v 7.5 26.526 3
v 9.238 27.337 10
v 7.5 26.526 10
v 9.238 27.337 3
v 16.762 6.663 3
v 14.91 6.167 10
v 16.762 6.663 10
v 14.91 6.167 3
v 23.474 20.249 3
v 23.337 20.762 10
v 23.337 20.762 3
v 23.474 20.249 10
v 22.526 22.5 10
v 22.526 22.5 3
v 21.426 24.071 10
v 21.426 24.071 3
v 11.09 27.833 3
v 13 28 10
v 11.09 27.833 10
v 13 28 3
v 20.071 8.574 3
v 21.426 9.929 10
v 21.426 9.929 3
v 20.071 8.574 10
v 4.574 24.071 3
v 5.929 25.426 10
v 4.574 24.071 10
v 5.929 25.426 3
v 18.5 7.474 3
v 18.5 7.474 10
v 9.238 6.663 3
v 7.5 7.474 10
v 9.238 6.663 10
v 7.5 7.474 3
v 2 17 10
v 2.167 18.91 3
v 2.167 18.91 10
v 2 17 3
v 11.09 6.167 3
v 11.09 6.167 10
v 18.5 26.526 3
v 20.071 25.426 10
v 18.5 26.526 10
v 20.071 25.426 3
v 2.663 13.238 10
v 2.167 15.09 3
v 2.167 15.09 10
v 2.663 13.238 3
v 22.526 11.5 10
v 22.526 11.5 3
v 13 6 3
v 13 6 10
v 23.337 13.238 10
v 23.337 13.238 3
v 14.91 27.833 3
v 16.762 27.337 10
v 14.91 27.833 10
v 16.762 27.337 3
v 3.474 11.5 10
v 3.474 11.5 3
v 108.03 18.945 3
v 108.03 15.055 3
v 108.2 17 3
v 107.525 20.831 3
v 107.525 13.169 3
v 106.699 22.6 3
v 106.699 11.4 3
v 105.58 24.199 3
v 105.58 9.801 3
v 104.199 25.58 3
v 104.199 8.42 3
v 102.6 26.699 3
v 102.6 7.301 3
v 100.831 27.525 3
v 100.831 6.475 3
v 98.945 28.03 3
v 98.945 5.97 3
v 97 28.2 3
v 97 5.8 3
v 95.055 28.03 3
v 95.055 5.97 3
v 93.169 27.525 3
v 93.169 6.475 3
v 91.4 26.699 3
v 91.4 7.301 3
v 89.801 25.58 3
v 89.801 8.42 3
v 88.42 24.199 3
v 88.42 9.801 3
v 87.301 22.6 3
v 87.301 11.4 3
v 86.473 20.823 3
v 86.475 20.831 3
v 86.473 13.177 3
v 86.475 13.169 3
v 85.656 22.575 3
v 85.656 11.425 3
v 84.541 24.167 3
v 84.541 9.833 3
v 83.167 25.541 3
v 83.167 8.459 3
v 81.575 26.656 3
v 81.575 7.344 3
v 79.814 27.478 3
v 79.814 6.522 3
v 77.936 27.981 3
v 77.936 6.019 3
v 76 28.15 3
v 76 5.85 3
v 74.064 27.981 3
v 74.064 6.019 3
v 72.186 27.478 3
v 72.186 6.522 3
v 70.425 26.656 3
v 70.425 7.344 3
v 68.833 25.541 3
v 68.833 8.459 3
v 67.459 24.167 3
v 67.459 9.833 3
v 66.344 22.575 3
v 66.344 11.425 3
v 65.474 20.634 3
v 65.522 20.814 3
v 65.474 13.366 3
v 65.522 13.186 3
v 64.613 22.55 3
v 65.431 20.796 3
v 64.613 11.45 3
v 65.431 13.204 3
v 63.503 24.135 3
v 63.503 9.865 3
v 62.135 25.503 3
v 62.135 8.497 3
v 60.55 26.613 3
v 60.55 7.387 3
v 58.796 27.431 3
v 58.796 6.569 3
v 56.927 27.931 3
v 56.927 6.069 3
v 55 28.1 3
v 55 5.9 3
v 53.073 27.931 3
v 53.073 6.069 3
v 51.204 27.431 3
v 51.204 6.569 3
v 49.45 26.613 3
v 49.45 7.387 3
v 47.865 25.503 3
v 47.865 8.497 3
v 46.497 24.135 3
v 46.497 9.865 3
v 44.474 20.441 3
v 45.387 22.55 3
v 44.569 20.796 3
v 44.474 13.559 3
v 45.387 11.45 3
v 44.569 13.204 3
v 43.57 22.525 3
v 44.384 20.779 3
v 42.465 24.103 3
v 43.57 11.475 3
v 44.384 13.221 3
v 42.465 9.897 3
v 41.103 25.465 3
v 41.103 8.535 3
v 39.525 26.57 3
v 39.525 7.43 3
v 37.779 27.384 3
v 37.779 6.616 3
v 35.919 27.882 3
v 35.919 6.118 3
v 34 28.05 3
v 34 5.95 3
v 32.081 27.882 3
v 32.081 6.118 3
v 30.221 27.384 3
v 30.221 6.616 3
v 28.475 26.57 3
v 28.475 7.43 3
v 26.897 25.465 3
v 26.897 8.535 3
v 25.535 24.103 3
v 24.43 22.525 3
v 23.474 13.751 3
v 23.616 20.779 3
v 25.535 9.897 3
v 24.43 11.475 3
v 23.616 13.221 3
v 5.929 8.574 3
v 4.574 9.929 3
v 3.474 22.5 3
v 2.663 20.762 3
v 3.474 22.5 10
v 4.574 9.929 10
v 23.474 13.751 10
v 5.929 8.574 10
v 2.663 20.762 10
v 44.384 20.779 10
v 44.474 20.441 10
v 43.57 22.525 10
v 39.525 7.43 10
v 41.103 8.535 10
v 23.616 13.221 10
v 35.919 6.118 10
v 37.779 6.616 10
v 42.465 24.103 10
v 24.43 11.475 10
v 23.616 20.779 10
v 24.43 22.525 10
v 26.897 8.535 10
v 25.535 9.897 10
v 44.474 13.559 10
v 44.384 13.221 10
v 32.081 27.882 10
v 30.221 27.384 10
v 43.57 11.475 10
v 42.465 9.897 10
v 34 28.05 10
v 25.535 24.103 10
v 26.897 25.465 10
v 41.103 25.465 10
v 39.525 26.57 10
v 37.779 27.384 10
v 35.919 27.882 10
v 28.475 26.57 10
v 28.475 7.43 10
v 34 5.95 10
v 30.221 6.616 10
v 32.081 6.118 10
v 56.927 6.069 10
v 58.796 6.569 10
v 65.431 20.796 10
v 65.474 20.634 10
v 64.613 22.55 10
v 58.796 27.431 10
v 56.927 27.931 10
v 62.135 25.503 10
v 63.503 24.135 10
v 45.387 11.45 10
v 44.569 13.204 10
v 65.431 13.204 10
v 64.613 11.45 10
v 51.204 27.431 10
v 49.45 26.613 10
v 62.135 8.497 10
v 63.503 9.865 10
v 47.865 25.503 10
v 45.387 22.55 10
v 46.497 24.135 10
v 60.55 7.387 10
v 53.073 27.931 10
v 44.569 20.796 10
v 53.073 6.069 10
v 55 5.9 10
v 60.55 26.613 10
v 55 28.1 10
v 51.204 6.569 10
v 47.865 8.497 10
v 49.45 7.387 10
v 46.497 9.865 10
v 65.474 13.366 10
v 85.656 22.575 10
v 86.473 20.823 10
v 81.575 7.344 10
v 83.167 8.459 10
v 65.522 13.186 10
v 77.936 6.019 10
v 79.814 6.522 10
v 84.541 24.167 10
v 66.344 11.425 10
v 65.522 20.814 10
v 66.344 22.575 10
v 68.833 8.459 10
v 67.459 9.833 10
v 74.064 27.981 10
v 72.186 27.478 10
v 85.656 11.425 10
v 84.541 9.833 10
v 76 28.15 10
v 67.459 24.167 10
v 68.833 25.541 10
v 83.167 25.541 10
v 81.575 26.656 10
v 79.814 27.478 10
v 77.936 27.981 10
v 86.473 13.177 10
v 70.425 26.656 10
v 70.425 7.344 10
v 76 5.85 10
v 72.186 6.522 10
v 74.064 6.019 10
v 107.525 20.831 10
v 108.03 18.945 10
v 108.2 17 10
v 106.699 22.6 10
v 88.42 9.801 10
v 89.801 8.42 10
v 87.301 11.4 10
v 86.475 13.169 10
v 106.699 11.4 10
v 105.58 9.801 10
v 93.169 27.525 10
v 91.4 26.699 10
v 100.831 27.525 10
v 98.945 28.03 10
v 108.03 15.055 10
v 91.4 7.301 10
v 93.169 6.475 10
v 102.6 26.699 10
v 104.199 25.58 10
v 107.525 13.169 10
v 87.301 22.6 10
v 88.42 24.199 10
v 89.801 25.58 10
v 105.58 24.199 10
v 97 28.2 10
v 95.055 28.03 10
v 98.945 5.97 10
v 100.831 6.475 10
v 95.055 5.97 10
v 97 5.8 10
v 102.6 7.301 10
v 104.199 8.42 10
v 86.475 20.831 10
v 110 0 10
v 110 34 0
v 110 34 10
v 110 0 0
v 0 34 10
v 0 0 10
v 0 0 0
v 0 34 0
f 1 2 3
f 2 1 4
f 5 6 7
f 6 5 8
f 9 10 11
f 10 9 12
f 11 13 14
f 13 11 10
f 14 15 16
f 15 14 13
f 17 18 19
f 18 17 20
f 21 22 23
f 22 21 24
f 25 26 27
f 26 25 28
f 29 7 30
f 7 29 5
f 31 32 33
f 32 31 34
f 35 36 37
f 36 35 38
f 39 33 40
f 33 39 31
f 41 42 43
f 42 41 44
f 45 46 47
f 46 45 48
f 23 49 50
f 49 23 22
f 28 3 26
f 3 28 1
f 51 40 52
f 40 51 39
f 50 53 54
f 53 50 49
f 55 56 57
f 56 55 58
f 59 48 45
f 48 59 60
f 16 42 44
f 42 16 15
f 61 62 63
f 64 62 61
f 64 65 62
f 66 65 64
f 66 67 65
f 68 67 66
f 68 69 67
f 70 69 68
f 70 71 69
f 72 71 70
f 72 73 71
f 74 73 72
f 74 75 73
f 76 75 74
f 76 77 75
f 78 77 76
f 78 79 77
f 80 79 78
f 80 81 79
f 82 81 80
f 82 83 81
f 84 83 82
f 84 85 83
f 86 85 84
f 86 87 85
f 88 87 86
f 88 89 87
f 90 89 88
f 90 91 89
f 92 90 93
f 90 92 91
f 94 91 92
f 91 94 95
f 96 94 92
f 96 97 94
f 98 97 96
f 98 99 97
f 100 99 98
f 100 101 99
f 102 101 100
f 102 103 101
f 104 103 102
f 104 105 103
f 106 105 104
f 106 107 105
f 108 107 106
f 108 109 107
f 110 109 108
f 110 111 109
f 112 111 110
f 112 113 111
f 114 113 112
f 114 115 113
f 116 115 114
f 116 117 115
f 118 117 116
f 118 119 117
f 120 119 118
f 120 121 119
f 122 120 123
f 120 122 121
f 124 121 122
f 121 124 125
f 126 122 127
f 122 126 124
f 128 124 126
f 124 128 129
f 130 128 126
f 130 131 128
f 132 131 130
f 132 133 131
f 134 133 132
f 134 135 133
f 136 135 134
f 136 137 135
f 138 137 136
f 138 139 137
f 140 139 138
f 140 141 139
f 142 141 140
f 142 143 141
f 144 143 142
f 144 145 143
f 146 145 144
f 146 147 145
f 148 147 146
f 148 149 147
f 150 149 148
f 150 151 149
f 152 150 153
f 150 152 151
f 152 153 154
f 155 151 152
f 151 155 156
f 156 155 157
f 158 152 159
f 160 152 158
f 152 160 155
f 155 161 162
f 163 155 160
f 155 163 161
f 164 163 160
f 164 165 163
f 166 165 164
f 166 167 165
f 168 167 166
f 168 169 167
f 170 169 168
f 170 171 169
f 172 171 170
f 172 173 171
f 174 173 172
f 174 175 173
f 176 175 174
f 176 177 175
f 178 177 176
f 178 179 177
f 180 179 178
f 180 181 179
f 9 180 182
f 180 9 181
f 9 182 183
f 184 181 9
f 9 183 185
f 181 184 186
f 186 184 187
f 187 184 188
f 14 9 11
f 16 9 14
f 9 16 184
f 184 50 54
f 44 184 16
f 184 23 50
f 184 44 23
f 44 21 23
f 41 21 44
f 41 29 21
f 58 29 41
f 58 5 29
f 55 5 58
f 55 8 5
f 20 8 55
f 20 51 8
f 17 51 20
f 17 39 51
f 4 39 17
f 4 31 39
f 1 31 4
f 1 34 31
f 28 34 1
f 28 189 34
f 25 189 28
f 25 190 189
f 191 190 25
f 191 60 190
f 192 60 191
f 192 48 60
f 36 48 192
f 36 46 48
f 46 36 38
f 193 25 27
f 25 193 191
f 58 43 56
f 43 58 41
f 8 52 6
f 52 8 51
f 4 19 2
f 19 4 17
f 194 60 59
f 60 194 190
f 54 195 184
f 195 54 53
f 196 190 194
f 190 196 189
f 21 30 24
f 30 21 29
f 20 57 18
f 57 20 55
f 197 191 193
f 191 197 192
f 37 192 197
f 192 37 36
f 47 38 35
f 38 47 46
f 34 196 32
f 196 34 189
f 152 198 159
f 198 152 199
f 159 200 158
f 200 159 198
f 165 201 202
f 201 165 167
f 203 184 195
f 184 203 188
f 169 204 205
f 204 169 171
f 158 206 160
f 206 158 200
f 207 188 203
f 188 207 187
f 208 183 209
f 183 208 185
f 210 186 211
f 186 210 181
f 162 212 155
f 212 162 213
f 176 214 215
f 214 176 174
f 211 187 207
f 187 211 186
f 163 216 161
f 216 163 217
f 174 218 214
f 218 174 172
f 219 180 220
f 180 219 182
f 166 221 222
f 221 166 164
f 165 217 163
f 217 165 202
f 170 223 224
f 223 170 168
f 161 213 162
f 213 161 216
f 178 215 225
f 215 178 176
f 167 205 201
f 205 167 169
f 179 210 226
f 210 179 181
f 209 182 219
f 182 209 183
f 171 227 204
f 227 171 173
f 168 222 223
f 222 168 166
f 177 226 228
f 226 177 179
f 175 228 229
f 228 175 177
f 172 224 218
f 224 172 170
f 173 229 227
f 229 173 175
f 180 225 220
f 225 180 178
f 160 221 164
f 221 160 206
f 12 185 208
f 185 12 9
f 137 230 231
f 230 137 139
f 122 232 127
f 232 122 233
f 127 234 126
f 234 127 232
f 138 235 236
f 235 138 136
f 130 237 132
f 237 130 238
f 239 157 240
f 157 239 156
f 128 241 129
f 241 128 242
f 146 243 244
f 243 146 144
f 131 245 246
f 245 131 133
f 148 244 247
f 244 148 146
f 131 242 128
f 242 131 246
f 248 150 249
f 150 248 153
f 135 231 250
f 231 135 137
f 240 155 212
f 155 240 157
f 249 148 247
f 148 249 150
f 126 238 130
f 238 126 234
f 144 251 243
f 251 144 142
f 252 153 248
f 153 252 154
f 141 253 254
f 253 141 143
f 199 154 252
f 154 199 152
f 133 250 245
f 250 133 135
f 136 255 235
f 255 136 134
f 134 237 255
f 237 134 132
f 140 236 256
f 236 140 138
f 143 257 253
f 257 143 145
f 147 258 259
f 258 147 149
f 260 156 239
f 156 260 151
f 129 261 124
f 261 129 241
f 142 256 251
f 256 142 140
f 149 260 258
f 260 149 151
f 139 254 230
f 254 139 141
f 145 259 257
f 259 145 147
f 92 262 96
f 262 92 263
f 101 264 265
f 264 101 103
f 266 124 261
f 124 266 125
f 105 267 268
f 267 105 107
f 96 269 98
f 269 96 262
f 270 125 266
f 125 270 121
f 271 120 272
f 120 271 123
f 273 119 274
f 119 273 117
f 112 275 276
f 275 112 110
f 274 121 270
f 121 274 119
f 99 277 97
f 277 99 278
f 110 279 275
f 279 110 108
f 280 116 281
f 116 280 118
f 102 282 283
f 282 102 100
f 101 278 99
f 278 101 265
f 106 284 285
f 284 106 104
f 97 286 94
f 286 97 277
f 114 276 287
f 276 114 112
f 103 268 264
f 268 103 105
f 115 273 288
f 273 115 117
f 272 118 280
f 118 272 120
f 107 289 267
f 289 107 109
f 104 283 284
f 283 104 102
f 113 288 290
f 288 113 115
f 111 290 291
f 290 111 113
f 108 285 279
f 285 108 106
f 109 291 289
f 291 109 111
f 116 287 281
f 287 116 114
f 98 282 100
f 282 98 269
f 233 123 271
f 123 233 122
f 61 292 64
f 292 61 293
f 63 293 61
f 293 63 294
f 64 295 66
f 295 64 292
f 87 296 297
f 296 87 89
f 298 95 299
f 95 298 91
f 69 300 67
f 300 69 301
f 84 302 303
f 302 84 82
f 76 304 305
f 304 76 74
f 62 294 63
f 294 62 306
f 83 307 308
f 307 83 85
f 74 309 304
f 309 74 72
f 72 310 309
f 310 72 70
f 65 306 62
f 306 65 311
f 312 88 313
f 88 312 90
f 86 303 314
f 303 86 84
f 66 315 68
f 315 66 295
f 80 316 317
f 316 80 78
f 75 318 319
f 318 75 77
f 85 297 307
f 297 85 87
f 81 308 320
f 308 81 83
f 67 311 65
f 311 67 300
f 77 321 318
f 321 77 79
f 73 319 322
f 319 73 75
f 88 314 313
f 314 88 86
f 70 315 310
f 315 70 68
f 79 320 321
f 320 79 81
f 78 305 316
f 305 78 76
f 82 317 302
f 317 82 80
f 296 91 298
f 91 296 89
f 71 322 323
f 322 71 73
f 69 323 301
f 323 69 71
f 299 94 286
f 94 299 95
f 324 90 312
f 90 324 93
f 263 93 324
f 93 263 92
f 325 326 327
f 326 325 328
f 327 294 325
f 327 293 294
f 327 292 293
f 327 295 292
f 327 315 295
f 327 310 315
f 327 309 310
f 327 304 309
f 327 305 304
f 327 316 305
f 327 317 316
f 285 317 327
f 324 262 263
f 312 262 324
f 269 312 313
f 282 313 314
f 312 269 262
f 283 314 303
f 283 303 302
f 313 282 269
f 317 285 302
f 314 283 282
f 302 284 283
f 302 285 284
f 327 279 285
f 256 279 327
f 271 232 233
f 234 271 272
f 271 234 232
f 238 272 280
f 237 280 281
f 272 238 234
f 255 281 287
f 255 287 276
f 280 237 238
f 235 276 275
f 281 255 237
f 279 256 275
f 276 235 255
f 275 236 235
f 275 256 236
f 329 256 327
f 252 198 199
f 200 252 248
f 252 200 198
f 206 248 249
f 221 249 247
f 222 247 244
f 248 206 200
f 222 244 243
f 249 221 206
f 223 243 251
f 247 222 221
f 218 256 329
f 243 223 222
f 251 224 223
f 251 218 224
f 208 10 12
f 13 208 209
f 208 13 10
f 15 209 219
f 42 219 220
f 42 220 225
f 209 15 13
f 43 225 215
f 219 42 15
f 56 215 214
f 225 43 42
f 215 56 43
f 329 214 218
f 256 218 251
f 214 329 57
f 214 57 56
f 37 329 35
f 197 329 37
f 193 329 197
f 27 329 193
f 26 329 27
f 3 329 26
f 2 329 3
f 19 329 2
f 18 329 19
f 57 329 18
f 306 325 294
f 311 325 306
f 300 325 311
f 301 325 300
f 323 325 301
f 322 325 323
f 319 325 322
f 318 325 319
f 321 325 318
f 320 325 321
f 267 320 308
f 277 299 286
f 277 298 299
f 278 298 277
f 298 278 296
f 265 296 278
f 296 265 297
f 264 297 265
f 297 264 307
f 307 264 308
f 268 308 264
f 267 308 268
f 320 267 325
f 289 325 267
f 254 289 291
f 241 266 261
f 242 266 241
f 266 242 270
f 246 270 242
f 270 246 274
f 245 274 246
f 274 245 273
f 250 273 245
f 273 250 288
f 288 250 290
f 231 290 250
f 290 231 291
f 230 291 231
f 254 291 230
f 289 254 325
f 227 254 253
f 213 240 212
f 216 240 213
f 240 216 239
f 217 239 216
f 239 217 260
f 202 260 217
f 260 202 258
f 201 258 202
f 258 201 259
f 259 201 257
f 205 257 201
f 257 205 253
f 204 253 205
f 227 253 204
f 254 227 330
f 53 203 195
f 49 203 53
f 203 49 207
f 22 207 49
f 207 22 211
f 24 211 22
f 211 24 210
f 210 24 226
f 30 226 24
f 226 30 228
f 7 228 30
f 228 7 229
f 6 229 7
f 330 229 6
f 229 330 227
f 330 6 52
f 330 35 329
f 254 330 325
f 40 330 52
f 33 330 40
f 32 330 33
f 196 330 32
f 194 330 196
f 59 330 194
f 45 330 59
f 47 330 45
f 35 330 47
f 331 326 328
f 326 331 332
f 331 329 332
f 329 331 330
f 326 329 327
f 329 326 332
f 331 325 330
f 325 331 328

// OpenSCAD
$fn=36;
module bearing_coupon(){ds=[22.0,22.1,22.2,22.3,22.4];difference(){cube([110,34,10]);for(i=[0:4])translate([13+i*21,17,3])cylinder(h=8,d=ds[i]);}}
module shaft_coupon(){d8=[8.0,8.1,8.2,8.3,8.4];d10=[10.0,10.1,10.2,10.3,10.4];difference(){cube([110,50,8]);for(i=[0:4])translate([13+i*21,14,-1])cylinder(h=10,d=d8[i]);for(i=[0:4])translate([13+i*21,36,-1])cylinder(h=10,d=d10[i]);}}
module magnet_coupon(){ds=[6.0,6.1,6.2,6.3,6.4];difference(){cube([110,32,6]);for(i=[0:4])translate([13+i*21,16,3])cylinder(h=4,d=ds[i]);}}
module tube_coupon(){ds=[22.0,22.2,22.4,22.6,22.8];difference(){cube([130,38,8]);for(i=[0:4])translate([15+i*25,19,-1])cylinder(h=10,d=ds[i]);}}
module fastener_coupon(){d3=[3.2,3.4,3.6];d4=[4.2,4.4,4.6];d5=[5.2,5.4,5.6];difference(){cube([105,42,7]);for(i=[0:2])translate([15+i*15,12,-1])cylinder(h=9,d=d3[i]);for(i=[0:2])translate([15+i*15,30,-1])cylinder(h=9,d=d4[i]);for(i=[0:2])translate([65+i*15,21,-1])cylinder(h=9,d=d5[i]);}}
part=is_undef(part)?"bearing":part;
if(part=="bearing")bearing_coupon();if(part=="shaft")shaft_coupon();if(part=="magnet")magnet_coupon();if(part=="tube")tube_coupon();if(part=="fastener")fastener_coupon();
